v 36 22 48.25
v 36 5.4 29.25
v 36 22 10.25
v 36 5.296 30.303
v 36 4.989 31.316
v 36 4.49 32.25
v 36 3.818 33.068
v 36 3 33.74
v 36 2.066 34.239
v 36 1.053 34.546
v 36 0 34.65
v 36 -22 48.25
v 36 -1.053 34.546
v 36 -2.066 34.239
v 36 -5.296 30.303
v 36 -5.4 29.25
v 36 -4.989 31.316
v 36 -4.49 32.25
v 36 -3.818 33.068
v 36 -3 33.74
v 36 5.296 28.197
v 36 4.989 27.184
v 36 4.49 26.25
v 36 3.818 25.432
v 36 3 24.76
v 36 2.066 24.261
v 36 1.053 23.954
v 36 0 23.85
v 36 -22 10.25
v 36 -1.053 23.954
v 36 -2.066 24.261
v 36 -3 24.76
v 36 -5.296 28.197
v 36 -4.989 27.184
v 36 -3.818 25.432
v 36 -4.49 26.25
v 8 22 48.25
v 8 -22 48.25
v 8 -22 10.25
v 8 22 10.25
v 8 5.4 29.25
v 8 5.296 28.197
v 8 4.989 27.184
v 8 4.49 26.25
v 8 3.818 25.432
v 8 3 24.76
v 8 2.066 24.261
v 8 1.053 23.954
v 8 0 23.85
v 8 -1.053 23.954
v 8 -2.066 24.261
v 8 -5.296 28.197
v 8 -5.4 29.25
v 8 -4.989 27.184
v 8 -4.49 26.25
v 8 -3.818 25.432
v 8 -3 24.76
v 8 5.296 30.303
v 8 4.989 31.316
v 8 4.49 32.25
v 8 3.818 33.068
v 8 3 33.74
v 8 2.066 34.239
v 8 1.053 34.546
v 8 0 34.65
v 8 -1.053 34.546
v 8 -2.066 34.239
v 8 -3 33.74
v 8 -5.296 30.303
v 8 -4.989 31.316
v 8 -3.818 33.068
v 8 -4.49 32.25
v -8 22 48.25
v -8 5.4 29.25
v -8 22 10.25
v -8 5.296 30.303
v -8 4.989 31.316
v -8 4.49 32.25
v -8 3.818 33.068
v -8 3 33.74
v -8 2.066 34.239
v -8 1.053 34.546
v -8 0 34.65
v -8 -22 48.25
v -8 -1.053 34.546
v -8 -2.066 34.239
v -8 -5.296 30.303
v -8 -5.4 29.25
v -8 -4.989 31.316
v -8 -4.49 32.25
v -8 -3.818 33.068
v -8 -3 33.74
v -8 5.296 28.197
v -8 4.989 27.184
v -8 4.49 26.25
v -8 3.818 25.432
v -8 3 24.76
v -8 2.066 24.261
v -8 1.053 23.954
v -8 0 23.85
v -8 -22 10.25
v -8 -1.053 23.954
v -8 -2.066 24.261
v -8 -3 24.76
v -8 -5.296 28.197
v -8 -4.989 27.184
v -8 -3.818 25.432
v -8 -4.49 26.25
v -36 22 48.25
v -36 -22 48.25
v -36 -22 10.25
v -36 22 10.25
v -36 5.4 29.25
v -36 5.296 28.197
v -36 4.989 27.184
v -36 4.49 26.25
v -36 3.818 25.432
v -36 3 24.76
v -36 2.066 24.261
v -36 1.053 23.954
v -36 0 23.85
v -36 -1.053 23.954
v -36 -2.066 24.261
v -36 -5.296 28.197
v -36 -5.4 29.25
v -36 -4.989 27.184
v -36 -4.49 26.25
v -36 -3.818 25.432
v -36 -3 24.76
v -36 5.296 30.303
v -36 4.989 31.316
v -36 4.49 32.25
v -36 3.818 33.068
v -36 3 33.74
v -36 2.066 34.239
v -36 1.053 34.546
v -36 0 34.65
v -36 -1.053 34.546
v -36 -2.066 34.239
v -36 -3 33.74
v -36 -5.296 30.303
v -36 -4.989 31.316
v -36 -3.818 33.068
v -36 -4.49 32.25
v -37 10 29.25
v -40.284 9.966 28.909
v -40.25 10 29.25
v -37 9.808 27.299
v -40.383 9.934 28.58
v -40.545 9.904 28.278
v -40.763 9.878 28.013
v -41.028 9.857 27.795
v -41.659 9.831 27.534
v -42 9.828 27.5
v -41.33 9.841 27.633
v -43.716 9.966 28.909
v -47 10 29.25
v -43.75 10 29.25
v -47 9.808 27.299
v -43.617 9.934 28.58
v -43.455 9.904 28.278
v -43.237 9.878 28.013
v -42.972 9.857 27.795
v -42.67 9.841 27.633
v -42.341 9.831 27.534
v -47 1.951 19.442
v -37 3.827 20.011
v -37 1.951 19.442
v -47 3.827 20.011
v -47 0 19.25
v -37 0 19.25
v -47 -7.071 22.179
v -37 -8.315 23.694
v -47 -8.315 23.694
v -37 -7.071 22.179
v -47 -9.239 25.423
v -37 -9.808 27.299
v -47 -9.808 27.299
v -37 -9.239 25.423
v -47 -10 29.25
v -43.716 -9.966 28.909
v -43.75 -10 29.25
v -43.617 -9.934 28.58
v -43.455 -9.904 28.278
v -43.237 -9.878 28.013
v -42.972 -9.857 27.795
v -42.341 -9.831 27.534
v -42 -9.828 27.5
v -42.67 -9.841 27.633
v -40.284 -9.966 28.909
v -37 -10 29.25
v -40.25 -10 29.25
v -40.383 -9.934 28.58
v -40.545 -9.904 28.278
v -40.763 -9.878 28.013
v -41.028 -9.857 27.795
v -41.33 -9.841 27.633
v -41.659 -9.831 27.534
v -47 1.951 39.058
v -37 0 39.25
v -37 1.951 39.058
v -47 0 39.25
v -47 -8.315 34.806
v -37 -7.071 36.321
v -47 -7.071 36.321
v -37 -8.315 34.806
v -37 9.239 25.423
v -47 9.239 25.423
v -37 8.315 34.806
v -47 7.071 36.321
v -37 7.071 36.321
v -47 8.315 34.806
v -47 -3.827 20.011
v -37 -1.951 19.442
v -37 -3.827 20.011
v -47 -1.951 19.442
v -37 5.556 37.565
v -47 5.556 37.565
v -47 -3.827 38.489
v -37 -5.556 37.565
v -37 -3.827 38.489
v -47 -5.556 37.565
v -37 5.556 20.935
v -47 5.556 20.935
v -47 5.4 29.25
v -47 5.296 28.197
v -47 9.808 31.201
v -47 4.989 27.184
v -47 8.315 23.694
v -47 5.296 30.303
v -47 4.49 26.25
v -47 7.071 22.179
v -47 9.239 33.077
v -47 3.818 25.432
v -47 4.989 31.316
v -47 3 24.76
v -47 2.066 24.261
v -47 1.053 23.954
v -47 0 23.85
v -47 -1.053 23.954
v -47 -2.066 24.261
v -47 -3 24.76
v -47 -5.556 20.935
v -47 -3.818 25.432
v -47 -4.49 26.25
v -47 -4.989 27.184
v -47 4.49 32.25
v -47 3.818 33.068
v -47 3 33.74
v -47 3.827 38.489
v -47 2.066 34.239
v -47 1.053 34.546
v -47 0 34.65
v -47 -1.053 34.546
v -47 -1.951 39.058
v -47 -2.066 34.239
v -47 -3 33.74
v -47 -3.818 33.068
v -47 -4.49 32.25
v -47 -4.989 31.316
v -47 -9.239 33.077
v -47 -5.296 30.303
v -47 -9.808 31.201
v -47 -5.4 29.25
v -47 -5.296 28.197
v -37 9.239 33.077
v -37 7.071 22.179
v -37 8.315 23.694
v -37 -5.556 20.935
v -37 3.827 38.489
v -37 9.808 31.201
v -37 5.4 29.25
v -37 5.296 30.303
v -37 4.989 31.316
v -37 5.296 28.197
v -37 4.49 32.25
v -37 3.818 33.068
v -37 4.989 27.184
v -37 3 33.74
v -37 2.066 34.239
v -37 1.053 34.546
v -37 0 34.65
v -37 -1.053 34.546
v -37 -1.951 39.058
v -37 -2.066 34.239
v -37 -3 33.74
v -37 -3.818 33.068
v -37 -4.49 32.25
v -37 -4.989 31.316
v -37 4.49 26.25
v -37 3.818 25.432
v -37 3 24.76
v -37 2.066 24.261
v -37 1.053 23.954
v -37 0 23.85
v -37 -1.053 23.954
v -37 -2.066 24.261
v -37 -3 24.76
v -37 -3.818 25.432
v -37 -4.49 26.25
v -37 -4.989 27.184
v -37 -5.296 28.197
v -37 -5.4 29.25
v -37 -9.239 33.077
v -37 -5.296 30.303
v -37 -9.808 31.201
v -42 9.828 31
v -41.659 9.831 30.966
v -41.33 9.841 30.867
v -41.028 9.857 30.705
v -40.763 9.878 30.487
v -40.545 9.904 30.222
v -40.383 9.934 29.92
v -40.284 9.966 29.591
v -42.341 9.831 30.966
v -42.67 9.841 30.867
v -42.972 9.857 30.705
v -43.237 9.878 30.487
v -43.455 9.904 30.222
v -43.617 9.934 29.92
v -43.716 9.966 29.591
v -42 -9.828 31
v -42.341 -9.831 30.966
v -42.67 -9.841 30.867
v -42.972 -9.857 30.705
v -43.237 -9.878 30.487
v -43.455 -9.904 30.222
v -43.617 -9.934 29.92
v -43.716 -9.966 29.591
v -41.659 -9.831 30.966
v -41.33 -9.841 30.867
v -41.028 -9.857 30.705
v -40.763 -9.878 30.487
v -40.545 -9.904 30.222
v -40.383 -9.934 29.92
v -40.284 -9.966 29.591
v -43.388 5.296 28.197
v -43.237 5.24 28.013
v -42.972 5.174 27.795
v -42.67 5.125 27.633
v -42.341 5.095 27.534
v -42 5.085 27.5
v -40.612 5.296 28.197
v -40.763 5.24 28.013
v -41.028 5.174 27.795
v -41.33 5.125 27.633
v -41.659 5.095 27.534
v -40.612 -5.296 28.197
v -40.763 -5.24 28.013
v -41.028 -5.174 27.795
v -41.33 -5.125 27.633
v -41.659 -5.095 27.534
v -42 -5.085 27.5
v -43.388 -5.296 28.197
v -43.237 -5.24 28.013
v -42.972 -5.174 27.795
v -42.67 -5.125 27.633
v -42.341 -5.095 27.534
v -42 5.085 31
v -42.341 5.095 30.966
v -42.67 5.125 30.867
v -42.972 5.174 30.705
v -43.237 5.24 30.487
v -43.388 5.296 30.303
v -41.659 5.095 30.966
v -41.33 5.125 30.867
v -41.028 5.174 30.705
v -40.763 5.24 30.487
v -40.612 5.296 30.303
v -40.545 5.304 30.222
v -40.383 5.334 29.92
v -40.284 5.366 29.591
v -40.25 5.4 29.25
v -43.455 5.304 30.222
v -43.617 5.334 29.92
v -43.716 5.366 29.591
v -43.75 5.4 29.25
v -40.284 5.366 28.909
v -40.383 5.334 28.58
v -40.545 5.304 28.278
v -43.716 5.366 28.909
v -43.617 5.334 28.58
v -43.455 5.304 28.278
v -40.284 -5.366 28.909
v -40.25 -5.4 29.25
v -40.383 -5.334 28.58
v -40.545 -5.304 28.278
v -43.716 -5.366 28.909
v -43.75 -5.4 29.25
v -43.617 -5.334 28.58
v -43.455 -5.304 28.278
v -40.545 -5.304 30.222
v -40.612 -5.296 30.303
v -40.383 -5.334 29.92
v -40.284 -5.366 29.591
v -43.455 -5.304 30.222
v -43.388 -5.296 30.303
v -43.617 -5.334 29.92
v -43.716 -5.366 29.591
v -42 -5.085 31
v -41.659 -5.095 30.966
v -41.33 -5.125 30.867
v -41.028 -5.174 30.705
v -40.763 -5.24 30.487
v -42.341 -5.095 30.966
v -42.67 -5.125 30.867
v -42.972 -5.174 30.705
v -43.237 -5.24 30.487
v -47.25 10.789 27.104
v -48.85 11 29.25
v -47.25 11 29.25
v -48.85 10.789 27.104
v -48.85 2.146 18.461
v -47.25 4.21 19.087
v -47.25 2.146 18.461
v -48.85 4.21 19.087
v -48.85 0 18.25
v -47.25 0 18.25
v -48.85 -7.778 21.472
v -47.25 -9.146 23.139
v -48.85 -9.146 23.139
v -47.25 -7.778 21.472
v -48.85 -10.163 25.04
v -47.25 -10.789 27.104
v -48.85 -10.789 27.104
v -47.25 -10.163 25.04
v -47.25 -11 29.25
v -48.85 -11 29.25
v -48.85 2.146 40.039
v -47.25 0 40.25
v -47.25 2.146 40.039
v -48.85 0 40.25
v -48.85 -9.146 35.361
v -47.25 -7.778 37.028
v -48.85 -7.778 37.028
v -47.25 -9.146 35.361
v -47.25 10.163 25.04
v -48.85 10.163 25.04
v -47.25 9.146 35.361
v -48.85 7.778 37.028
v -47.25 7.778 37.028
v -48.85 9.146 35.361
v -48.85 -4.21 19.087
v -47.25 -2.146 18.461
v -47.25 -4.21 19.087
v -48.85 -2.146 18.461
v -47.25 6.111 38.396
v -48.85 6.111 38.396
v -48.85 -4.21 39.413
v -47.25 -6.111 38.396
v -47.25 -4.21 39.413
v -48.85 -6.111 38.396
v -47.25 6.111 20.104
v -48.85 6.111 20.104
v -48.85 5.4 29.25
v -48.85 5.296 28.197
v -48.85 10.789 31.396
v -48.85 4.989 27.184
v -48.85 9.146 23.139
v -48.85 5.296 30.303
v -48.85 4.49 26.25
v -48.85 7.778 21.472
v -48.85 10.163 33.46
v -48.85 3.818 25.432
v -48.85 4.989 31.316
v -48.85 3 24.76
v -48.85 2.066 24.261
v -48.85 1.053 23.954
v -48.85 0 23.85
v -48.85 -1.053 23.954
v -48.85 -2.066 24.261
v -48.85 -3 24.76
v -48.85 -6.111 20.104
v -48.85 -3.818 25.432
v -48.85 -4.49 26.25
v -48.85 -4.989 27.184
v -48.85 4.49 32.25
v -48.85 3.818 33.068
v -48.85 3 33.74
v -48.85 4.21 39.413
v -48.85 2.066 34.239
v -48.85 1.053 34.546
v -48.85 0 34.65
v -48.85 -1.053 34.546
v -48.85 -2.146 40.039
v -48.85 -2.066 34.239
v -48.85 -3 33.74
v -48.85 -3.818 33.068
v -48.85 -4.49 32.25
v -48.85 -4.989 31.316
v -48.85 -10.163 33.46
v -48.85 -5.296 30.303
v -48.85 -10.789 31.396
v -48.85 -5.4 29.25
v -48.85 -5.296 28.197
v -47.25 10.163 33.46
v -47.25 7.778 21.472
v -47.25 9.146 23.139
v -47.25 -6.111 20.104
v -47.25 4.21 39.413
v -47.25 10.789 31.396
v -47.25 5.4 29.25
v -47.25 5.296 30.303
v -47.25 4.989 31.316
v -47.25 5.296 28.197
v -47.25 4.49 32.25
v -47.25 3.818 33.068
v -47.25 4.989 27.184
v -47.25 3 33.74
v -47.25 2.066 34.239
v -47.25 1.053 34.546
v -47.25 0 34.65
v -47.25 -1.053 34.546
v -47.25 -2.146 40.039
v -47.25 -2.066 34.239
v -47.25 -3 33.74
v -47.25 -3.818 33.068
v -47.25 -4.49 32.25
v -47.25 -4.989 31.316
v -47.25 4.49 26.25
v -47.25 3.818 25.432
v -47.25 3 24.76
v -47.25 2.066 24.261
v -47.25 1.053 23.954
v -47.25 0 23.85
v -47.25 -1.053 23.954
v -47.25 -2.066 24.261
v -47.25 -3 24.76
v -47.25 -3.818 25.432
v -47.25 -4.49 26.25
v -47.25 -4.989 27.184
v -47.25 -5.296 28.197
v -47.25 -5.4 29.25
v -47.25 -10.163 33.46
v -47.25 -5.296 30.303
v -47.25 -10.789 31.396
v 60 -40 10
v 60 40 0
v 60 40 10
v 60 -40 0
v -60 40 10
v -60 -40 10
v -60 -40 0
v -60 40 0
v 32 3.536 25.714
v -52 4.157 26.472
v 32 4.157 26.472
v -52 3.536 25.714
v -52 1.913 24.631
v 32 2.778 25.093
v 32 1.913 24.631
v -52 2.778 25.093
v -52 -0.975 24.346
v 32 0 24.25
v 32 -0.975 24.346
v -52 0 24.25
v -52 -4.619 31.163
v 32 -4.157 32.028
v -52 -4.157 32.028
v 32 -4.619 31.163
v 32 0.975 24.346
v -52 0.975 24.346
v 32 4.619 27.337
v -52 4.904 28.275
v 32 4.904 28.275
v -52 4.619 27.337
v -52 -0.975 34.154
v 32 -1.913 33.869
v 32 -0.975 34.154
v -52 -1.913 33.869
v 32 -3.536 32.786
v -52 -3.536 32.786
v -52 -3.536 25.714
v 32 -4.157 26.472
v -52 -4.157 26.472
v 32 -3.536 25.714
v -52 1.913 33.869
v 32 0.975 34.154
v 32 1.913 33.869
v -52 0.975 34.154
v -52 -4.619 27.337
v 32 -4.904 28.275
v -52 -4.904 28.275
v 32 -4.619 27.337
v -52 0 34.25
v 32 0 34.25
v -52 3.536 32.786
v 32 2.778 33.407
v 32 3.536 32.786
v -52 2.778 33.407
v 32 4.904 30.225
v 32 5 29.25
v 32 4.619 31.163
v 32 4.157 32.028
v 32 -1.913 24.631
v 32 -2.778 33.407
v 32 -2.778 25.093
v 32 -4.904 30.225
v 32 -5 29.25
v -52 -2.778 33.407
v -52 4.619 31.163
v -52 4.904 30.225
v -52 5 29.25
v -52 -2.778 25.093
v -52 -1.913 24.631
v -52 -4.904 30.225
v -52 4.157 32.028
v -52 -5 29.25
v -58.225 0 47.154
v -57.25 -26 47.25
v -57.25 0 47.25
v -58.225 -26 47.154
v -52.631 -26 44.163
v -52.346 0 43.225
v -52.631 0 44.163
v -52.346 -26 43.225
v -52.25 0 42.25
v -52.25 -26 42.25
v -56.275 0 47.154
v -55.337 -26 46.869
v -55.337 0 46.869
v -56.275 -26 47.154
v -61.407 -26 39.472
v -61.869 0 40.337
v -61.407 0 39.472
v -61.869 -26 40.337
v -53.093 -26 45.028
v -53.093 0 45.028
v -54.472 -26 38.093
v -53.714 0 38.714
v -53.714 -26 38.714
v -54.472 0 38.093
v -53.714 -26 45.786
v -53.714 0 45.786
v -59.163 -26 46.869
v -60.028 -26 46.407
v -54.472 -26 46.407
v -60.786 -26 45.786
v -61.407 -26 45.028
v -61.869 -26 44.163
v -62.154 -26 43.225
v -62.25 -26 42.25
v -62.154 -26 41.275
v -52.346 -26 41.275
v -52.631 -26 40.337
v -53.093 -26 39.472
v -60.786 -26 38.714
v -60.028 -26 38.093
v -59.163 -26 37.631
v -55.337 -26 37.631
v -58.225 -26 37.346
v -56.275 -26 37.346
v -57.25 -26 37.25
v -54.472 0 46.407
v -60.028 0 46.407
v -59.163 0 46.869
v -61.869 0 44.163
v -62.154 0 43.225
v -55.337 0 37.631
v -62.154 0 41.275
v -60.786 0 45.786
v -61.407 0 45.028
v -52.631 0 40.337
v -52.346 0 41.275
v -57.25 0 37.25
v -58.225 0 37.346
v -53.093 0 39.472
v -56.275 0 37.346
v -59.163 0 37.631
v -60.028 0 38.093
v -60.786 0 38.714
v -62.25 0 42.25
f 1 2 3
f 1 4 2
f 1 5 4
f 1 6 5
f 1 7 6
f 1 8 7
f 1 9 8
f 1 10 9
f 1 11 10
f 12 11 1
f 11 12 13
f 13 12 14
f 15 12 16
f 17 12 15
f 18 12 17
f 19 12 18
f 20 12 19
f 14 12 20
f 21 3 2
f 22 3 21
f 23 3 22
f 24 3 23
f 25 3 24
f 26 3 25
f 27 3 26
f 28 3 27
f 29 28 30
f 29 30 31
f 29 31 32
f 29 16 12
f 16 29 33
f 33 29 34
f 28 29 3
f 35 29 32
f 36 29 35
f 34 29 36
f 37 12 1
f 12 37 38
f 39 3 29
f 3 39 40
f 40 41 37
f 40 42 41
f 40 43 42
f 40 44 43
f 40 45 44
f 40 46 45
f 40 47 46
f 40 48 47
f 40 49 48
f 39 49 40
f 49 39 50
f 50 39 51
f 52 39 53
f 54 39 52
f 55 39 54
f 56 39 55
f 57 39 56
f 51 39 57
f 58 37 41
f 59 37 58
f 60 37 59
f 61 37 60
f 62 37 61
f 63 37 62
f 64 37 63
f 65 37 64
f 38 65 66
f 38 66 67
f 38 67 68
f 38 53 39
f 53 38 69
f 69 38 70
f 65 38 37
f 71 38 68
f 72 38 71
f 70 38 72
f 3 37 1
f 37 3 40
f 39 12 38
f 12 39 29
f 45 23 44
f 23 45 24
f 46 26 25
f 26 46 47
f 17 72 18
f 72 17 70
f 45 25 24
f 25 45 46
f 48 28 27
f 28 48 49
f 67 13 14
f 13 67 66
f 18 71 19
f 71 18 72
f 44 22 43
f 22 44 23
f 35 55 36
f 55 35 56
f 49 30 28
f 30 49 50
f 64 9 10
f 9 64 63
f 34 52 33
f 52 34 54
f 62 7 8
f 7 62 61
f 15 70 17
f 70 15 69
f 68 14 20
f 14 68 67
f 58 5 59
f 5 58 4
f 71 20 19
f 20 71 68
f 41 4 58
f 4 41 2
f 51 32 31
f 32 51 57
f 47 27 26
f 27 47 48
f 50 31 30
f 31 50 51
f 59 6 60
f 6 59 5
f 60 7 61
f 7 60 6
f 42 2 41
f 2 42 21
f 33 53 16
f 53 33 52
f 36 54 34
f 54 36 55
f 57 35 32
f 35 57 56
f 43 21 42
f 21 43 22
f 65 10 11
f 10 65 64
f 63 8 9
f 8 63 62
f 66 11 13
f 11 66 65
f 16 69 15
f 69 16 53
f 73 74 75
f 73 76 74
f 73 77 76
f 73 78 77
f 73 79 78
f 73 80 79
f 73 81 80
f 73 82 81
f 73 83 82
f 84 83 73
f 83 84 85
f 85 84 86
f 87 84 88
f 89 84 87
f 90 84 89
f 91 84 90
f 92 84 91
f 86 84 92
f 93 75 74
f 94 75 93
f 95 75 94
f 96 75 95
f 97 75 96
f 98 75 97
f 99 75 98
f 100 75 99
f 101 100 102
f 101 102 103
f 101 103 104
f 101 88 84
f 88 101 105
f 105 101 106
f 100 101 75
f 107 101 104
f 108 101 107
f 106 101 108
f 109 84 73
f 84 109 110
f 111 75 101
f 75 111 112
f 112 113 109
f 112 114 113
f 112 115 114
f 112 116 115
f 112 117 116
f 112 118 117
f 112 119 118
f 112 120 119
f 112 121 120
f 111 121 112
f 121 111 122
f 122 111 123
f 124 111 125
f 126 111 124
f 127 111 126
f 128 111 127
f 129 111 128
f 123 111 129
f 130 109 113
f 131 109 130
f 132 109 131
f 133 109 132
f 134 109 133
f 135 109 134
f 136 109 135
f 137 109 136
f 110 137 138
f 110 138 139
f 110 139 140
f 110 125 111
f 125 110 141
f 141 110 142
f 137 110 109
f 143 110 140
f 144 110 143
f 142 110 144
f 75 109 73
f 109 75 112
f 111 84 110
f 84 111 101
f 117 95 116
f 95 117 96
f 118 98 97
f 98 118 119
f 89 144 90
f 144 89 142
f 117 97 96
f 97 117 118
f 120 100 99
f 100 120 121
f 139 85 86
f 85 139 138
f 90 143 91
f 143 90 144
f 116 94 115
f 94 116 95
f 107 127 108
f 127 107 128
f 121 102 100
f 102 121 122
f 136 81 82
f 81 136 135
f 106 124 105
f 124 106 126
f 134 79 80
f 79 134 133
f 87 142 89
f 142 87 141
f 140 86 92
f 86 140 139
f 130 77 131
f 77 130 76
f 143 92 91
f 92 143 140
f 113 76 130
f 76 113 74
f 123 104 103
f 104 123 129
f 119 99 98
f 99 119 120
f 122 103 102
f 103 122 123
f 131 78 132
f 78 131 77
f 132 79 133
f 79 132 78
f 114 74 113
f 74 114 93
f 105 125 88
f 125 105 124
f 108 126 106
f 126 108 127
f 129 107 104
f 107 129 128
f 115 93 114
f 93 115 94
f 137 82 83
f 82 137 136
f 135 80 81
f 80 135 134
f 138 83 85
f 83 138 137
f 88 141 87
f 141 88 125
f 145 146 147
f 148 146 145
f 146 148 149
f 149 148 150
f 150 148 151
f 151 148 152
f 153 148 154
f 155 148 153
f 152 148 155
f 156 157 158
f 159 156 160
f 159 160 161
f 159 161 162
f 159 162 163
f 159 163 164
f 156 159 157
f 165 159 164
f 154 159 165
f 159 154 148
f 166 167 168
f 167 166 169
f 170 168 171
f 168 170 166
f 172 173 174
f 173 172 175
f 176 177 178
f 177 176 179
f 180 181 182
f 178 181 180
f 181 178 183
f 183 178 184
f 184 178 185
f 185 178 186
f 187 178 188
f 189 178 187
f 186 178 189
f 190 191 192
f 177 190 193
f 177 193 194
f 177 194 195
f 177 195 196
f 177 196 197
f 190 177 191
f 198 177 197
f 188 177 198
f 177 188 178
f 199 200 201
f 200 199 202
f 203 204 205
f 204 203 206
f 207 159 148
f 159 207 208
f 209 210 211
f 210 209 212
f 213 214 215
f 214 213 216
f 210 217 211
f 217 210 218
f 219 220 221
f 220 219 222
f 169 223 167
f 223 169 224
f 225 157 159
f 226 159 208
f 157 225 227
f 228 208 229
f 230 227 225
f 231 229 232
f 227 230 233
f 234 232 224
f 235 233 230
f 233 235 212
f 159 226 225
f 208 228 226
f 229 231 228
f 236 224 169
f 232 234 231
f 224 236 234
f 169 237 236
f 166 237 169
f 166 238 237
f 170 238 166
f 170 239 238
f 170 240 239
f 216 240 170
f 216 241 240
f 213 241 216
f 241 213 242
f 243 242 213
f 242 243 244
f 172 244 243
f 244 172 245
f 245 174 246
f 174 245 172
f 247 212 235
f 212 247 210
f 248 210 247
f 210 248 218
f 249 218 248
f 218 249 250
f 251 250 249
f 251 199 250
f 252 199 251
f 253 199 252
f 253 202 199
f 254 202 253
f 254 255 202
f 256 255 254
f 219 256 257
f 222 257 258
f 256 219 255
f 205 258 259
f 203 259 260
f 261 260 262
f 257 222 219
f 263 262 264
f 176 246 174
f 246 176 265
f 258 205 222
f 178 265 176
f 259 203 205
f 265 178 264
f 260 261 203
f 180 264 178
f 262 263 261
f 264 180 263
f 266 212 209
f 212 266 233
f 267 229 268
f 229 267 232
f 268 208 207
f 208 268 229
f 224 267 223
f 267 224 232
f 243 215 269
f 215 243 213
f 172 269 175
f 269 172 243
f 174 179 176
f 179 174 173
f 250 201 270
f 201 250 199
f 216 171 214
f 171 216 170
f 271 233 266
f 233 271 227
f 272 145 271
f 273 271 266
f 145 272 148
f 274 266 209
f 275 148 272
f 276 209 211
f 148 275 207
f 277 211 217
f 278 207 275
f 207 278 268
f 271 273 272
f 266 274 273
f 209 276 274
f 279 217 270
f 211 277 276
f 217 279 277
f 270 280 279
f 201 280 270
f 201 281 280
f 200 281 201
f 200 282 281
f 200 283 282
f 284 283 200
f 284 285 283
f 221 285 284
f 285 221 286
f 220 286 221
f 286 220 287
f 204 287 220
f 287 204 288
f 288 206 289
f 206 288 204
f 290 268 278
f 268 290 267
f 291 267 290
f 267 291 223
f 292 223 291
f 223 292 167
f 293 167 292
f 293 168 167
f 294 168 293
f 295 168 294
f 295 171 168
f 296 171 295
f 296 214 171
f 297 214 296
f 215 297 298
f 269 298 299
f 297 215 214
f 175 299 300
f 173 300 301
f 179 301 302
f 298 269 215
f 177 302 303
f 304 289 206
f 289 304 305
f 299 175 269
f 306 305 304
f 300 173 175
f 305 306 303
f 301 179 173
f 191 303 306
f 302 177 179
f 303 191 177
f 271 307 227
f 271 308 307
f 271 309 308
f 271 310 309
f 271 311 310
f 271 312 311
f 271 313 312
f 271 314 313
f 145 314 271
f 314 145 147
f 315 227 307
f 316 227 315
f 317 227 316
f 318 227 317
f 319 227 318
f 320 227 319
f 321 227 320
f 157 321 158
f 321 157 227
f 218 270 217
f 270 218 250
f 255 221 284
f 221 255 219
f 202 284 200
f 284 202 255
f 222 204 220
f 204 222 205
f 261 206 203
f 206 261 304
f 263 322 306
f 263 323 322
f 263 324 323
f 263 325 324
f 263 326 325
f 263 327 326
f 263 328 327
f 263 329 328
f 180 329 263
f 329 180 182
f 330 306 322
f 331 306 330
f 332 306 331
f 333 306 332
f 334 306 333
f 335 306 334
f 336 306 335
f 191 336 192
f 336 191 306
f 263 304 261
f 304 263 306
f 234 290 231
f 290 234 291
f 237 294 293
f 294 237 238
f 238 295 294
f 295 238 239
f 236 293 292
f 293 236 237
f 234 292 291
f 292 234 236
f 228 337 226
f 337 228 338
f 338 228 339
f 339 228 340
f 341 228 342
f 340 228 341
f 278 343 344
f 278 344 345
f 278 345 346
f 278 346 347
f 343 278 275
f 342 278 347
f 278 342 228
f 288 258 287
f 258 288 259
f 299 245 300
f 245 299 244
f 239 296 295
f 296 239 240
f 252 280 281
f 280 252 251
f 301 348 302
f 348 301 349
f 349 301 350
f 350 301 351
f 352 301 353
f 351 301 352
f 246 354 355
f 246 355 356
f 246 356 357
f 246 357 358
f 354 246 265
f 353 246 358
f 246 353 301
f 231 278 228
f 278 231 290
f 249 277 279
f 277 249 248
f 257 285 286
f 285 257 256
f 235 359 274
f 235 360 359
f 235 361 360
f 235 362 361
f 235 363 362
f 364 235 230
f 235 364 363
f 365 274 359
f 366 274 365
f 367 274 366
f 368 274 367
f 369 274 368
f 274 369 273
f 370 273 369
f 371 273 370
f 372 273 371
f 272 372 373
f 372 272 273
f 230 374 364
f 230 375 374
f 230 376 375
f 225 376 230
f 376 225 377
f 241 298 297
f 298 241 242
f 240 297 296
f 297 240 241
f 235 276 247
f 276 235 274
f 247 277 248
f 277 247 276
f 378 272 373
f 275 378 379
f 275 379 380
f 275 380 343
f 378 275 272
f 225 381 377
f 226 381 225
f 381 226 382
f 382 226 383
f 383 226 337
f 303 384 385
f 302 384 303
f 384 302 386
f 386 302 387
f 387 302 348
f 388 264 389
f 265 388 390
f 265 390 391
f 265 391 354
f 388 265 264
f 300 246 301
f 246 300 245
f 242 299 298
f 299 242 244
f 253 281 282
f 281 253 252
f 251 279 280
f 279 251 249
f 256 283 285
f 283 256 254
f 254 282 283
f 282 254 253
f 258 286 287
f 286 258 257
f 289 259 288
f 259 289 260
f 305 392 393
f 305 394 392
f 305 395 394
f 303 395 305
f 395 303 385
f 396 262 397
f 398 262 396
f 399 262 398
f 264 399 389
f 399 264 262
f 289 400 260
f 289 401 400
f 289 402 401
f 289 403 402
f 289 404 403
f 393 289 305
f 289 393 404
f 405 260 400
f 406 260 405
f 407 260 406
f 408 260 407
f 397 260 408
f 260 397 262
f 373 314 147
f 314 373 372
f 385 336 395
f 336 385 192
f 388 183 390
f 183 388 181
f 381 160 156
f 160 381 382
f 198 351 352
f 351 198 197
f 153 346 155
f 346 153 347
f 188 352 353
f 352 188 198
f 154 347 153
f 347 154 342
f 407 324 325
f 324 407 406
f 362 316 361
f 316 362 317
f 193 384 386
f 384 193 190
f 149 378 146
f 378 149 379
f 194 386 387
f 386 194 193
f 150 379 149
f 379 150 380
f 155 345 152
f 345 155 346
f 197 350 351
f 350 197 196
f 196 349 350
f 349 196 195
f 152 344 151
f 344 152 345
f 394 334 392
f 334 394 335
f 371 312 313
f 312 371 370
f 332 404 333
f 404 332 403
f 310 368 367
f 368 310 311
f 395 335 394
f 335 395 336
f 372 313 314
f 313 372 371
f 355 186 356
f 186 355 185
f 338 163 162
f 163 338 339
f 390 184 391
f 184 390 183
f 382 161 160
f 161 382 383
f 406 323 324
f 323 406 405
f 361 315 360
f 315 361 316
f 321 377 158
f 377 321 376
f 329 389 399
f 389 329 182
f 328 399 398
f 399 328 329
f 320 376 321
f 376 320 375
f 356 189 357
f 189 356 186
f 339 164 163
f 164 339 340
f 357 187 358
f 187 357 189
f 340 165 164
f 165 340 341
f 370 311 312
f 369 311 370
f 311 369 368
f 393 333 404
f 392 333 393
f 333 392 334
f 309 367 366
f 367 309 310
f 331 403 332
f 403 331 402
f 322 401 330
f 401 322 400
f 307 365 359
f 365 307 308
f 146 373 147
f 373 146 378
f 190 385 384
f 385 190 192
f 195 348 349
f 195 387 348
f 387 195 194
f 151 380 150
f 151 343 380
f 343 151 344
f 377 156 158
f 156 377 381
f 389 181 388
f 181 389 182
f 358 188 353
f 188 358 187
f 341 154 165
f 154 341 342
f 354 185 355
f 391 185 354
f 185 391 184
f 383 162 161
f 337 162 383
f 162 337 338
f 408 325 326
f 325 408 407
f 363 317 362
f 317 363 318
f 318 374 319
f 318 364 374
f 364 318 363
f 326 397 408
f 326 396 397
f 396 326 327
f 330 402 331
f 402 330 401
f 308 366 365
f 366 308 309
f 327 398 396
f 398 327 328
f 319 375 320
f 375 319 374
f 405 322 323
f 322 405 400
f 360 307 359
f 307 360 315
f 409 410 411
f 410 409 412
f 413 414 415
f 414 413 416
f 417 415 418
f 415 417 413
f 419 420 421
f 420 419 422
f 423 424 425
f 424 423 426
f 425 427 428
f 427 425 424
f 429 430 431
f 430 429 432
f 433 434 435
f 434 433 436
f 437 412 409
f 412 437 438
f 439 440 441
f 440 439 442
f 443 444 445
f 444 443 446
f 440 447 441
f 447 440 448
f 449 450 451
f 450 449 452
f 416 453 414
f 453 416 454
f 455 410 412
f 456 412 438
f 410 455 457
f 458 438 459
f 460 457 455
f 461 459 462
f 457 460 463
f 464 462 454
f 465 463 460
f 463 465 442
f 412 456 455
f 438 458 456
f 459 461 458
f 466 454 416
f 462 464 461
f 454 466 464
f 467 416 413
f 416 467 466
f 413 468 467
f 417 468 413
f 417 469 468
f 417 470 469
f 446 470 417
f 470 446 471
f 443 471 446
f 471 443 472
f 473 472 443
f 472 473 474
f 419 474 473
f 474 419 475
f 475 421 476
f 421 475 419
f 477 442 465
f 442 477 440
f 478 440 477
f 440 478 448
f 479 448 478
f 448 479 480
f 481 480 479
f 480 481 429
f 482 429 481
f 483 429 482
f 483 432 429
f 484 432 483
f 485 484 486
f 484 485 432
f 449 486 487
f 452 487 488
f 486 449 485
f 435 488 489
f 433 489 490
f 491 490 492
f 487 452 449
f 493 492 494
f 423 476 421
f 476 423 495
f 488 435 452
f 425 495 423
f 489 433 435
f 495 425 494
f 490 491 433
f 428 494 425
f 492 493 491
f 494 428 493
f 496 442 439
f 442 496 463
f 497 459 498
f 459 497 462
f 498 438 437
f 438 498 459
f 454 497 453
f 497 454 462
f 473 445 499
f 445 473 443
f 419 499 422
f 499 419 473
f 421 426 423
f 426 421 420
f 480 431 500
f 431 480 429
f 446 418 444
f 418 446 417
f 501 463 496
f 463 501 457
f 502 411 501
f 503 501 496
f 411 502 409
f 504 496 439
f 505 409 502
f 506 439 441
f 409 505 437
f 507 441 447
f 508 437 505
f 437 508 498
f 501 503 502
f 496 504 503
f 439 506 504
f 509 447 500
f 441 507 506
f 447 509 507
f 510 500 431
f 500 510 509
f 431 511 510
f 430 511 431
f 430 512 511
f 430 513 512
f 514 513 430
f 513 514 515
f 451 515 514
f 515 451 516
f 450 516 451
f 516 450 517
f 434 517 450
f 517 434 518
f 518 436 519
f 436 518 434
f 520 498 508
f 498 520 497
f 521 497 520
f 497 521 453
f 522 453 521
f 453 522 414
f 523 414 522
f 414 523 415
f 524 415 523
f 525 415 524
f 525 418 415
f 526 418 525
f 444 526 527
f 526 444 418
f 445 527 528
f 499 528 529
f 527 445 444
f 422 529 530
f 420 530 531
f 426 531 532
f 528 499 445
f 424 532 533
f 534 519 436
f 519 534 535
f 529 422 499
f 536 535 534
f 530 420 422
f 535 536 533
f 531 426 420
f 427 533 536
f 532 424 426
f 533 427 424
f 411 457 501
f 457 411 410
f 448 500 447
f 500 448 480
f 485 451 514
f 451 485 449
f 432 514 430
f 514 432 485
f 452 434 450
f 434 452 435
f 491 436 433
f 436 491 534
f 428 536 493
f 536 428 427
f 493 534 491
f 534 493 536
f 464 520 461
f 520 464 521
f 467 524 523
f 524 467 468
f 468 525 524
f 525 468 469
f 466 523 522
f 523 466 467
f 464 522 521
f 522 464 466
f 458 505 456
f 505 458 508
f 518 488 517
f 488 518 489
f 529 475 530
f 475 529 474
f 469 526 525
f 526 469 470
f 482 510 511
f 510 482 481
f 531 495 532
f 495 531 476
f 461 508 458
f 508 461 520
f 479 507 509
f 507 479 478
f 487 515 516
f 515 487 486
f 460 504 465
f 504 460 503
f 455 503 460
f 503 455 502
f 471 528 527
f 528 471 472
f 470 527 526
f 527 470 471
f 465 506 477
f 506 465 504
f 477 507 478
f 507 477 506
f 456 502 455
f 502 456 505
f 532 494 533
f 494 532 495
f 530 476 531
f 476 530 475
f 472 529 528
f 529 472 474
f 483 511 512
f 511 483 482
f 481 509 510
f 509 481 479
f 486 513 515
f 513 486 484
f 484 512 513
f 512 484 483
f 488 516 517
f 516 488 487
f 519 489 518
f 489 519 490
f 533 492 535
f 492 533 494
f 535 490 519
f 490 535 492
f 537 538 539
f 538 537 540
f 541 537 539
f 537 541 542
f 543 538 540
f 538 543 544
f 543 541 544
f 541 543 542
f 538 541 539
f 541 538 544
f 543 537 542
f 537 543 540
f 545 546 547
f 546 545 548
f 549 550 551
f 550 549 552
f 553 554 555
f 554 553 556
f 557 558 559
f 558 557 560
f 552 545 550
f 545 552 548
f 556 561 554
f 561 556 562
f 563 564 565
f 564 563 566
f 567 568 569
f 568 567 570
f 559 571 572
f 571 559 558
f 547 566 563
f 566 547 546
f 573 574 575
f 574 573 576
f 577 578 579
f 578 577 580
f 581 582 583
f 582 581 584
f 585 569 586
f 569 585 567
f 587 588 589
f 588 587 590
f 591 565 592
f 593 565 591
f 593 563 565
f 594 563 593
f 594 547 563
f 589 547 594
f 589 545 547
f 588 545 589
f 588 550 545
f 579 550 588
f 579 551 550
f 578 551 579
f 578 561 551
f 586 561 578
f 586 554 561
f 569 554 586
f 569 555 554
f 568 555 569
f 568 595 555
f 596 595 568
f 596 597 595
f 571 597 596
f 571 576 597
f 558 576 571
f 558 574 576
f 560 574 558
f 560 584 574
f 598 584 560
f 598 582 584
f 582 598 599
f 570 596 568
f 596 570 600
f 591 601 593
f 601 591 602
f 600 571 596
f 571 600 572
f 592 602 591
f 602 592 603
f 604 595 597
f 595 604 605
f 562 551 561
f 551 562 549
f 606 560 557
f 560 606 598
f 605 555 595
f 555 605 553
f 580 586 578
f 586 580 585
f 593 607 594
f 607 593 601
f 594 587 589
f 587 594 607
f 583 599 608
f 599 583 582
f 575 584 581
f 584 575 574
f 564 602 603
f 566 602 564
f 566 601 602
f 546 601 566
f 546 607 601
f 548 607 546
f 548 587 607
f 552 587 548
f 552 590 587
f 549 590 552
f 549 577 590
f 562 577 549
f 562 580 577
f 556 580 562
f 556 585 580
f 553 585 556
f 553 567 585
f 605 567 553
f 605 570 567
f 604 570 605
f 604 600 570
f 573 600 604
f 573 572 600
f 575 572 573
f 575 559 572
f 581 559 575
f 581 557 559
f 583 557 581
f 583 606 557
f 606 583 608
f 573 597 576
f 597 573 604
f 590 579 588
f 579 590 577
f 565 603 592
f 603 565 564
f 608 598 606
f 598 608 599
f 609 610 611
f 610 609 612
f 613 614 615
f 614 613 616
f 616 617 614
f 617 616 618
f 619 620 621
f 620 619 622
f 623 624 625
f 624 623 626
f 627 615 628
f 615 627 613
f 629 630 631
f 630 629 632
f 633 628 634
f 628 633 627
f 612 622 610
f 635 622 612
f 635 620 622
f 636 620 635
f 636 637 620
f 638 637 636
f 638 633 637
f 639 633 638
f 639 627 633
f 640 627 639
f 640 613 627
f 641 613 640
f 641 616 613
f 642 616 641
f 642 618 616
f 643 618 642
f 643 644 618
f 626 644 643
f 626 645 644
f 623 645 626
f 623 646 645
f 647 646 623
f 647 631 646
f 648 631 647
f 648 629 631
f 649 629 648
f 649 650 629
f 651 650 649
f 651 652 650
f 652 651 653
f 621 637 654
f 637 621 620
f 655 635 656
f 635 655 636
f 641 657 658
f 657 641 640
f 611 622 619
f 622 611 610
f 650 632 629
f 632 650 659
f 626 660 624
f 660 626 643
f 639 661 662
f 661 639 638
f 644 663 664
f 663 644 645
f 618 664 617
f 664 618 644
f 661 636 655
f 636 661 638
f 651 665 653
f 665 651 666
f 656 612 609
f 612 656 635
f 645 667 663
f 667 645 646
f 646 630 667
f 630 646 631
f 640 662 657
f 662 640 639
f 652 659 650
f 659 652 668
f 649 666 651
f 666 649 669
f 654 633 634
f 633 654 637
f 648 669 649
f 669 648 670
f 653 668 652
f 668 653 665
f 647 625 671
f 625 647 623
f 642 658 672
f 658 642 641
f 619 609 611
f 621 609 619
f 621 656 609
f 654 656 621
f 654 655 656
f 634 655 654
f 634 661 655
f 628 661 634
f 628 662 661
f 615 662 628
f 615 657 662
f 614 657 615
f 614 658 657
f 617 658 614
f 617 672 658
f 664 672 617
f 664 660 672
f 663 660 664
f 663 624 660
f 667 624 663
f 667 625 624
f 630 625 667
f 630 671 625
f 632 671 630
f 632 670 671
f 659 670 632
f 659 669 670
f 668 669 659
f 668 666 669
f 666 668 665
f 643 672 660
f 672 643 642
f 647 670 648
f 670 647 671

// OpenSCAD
$fn = 32;

// ------------------------------------------------------------------------
// Machine vise: screw d10, jaws 28 x 38 mm
// Every part is its own module, assembly() places every instance.
// ------------------------------------------------------------------------

// --- part 1 ---
module vise_bed() {
  difference() {
    translate([-60, -40, 0]) cube([120, 80, 10]);
  }
}

// --- part 2 ---
module vise_jaw() {
  difference() {
    translate([-14, -22, 0]) cube([28, 44, 38]);
    translate([0, 0, 19]) rotate([0, 90, 0]) cylinder(h = 30, d = 10.8, center = true);
  }
}

// --- part 3 ---
module vise_screw() {
  translate([0, 0, -42]) cylinder(h = 84, d = 10);
}

// --- part 4 ---
module screw_collar() {
  difference() {
    cylinder(h = 10, d = 20);
    translate([0, 0, -1]) cylinder(h = 12, d = 10.8);
    translate([0, 0, 5]) rotate([90, 0, 0]) cylinder(h = 22, d = 3.5, center = true);
  }
}

// --- part 5 ---
module screw_washer() {
  difference() {
      translate([0, 0, 0]) cylinder(h = 1.6, d = 22);
      translate([0, 0, -1]) cylinder(h = 3.6, d = 10.8);
    }
}

// --- part 6 ---
module vise_handle() {
  cylinder(h = 26, d = 10);
}

// --- assembly ---
module assembly() {
  color([0.80, 0.24, 0.20]) translate([0, 0, 0]) rotate([0, 0, 0]) vise_bed();
  color([0.20, 0.45, 0.75]) translate([22, 0, 10.25]) rotate([0, 0, 0]) vise_jaw();
  color([0.25, 0.62, 0.32]) translate([-22, 0, 10.25]) rotate([0, 0, 0]) vise_jaw();
  color([0.92, 0.70, 0.18]) translate([-10, 0, 29.25]) rotate([0, 90, 0]) vise_screw();
  color([0.58, 0.35, 0.70]) translate([-47, 0, 29.25]) rotate([0, 90, 0]) screw_collar();
  color([0.16, 0.66, 0.66]) translate([-48.85, 0, 29.25]) rotate([0, 90, 0]) screw_washer();
  color([0.85, 0.48, 0.18]) translate([-57.25, 0, 42.25]) rotate([90, 0, 0]) vise_handle();
}

assembly();
